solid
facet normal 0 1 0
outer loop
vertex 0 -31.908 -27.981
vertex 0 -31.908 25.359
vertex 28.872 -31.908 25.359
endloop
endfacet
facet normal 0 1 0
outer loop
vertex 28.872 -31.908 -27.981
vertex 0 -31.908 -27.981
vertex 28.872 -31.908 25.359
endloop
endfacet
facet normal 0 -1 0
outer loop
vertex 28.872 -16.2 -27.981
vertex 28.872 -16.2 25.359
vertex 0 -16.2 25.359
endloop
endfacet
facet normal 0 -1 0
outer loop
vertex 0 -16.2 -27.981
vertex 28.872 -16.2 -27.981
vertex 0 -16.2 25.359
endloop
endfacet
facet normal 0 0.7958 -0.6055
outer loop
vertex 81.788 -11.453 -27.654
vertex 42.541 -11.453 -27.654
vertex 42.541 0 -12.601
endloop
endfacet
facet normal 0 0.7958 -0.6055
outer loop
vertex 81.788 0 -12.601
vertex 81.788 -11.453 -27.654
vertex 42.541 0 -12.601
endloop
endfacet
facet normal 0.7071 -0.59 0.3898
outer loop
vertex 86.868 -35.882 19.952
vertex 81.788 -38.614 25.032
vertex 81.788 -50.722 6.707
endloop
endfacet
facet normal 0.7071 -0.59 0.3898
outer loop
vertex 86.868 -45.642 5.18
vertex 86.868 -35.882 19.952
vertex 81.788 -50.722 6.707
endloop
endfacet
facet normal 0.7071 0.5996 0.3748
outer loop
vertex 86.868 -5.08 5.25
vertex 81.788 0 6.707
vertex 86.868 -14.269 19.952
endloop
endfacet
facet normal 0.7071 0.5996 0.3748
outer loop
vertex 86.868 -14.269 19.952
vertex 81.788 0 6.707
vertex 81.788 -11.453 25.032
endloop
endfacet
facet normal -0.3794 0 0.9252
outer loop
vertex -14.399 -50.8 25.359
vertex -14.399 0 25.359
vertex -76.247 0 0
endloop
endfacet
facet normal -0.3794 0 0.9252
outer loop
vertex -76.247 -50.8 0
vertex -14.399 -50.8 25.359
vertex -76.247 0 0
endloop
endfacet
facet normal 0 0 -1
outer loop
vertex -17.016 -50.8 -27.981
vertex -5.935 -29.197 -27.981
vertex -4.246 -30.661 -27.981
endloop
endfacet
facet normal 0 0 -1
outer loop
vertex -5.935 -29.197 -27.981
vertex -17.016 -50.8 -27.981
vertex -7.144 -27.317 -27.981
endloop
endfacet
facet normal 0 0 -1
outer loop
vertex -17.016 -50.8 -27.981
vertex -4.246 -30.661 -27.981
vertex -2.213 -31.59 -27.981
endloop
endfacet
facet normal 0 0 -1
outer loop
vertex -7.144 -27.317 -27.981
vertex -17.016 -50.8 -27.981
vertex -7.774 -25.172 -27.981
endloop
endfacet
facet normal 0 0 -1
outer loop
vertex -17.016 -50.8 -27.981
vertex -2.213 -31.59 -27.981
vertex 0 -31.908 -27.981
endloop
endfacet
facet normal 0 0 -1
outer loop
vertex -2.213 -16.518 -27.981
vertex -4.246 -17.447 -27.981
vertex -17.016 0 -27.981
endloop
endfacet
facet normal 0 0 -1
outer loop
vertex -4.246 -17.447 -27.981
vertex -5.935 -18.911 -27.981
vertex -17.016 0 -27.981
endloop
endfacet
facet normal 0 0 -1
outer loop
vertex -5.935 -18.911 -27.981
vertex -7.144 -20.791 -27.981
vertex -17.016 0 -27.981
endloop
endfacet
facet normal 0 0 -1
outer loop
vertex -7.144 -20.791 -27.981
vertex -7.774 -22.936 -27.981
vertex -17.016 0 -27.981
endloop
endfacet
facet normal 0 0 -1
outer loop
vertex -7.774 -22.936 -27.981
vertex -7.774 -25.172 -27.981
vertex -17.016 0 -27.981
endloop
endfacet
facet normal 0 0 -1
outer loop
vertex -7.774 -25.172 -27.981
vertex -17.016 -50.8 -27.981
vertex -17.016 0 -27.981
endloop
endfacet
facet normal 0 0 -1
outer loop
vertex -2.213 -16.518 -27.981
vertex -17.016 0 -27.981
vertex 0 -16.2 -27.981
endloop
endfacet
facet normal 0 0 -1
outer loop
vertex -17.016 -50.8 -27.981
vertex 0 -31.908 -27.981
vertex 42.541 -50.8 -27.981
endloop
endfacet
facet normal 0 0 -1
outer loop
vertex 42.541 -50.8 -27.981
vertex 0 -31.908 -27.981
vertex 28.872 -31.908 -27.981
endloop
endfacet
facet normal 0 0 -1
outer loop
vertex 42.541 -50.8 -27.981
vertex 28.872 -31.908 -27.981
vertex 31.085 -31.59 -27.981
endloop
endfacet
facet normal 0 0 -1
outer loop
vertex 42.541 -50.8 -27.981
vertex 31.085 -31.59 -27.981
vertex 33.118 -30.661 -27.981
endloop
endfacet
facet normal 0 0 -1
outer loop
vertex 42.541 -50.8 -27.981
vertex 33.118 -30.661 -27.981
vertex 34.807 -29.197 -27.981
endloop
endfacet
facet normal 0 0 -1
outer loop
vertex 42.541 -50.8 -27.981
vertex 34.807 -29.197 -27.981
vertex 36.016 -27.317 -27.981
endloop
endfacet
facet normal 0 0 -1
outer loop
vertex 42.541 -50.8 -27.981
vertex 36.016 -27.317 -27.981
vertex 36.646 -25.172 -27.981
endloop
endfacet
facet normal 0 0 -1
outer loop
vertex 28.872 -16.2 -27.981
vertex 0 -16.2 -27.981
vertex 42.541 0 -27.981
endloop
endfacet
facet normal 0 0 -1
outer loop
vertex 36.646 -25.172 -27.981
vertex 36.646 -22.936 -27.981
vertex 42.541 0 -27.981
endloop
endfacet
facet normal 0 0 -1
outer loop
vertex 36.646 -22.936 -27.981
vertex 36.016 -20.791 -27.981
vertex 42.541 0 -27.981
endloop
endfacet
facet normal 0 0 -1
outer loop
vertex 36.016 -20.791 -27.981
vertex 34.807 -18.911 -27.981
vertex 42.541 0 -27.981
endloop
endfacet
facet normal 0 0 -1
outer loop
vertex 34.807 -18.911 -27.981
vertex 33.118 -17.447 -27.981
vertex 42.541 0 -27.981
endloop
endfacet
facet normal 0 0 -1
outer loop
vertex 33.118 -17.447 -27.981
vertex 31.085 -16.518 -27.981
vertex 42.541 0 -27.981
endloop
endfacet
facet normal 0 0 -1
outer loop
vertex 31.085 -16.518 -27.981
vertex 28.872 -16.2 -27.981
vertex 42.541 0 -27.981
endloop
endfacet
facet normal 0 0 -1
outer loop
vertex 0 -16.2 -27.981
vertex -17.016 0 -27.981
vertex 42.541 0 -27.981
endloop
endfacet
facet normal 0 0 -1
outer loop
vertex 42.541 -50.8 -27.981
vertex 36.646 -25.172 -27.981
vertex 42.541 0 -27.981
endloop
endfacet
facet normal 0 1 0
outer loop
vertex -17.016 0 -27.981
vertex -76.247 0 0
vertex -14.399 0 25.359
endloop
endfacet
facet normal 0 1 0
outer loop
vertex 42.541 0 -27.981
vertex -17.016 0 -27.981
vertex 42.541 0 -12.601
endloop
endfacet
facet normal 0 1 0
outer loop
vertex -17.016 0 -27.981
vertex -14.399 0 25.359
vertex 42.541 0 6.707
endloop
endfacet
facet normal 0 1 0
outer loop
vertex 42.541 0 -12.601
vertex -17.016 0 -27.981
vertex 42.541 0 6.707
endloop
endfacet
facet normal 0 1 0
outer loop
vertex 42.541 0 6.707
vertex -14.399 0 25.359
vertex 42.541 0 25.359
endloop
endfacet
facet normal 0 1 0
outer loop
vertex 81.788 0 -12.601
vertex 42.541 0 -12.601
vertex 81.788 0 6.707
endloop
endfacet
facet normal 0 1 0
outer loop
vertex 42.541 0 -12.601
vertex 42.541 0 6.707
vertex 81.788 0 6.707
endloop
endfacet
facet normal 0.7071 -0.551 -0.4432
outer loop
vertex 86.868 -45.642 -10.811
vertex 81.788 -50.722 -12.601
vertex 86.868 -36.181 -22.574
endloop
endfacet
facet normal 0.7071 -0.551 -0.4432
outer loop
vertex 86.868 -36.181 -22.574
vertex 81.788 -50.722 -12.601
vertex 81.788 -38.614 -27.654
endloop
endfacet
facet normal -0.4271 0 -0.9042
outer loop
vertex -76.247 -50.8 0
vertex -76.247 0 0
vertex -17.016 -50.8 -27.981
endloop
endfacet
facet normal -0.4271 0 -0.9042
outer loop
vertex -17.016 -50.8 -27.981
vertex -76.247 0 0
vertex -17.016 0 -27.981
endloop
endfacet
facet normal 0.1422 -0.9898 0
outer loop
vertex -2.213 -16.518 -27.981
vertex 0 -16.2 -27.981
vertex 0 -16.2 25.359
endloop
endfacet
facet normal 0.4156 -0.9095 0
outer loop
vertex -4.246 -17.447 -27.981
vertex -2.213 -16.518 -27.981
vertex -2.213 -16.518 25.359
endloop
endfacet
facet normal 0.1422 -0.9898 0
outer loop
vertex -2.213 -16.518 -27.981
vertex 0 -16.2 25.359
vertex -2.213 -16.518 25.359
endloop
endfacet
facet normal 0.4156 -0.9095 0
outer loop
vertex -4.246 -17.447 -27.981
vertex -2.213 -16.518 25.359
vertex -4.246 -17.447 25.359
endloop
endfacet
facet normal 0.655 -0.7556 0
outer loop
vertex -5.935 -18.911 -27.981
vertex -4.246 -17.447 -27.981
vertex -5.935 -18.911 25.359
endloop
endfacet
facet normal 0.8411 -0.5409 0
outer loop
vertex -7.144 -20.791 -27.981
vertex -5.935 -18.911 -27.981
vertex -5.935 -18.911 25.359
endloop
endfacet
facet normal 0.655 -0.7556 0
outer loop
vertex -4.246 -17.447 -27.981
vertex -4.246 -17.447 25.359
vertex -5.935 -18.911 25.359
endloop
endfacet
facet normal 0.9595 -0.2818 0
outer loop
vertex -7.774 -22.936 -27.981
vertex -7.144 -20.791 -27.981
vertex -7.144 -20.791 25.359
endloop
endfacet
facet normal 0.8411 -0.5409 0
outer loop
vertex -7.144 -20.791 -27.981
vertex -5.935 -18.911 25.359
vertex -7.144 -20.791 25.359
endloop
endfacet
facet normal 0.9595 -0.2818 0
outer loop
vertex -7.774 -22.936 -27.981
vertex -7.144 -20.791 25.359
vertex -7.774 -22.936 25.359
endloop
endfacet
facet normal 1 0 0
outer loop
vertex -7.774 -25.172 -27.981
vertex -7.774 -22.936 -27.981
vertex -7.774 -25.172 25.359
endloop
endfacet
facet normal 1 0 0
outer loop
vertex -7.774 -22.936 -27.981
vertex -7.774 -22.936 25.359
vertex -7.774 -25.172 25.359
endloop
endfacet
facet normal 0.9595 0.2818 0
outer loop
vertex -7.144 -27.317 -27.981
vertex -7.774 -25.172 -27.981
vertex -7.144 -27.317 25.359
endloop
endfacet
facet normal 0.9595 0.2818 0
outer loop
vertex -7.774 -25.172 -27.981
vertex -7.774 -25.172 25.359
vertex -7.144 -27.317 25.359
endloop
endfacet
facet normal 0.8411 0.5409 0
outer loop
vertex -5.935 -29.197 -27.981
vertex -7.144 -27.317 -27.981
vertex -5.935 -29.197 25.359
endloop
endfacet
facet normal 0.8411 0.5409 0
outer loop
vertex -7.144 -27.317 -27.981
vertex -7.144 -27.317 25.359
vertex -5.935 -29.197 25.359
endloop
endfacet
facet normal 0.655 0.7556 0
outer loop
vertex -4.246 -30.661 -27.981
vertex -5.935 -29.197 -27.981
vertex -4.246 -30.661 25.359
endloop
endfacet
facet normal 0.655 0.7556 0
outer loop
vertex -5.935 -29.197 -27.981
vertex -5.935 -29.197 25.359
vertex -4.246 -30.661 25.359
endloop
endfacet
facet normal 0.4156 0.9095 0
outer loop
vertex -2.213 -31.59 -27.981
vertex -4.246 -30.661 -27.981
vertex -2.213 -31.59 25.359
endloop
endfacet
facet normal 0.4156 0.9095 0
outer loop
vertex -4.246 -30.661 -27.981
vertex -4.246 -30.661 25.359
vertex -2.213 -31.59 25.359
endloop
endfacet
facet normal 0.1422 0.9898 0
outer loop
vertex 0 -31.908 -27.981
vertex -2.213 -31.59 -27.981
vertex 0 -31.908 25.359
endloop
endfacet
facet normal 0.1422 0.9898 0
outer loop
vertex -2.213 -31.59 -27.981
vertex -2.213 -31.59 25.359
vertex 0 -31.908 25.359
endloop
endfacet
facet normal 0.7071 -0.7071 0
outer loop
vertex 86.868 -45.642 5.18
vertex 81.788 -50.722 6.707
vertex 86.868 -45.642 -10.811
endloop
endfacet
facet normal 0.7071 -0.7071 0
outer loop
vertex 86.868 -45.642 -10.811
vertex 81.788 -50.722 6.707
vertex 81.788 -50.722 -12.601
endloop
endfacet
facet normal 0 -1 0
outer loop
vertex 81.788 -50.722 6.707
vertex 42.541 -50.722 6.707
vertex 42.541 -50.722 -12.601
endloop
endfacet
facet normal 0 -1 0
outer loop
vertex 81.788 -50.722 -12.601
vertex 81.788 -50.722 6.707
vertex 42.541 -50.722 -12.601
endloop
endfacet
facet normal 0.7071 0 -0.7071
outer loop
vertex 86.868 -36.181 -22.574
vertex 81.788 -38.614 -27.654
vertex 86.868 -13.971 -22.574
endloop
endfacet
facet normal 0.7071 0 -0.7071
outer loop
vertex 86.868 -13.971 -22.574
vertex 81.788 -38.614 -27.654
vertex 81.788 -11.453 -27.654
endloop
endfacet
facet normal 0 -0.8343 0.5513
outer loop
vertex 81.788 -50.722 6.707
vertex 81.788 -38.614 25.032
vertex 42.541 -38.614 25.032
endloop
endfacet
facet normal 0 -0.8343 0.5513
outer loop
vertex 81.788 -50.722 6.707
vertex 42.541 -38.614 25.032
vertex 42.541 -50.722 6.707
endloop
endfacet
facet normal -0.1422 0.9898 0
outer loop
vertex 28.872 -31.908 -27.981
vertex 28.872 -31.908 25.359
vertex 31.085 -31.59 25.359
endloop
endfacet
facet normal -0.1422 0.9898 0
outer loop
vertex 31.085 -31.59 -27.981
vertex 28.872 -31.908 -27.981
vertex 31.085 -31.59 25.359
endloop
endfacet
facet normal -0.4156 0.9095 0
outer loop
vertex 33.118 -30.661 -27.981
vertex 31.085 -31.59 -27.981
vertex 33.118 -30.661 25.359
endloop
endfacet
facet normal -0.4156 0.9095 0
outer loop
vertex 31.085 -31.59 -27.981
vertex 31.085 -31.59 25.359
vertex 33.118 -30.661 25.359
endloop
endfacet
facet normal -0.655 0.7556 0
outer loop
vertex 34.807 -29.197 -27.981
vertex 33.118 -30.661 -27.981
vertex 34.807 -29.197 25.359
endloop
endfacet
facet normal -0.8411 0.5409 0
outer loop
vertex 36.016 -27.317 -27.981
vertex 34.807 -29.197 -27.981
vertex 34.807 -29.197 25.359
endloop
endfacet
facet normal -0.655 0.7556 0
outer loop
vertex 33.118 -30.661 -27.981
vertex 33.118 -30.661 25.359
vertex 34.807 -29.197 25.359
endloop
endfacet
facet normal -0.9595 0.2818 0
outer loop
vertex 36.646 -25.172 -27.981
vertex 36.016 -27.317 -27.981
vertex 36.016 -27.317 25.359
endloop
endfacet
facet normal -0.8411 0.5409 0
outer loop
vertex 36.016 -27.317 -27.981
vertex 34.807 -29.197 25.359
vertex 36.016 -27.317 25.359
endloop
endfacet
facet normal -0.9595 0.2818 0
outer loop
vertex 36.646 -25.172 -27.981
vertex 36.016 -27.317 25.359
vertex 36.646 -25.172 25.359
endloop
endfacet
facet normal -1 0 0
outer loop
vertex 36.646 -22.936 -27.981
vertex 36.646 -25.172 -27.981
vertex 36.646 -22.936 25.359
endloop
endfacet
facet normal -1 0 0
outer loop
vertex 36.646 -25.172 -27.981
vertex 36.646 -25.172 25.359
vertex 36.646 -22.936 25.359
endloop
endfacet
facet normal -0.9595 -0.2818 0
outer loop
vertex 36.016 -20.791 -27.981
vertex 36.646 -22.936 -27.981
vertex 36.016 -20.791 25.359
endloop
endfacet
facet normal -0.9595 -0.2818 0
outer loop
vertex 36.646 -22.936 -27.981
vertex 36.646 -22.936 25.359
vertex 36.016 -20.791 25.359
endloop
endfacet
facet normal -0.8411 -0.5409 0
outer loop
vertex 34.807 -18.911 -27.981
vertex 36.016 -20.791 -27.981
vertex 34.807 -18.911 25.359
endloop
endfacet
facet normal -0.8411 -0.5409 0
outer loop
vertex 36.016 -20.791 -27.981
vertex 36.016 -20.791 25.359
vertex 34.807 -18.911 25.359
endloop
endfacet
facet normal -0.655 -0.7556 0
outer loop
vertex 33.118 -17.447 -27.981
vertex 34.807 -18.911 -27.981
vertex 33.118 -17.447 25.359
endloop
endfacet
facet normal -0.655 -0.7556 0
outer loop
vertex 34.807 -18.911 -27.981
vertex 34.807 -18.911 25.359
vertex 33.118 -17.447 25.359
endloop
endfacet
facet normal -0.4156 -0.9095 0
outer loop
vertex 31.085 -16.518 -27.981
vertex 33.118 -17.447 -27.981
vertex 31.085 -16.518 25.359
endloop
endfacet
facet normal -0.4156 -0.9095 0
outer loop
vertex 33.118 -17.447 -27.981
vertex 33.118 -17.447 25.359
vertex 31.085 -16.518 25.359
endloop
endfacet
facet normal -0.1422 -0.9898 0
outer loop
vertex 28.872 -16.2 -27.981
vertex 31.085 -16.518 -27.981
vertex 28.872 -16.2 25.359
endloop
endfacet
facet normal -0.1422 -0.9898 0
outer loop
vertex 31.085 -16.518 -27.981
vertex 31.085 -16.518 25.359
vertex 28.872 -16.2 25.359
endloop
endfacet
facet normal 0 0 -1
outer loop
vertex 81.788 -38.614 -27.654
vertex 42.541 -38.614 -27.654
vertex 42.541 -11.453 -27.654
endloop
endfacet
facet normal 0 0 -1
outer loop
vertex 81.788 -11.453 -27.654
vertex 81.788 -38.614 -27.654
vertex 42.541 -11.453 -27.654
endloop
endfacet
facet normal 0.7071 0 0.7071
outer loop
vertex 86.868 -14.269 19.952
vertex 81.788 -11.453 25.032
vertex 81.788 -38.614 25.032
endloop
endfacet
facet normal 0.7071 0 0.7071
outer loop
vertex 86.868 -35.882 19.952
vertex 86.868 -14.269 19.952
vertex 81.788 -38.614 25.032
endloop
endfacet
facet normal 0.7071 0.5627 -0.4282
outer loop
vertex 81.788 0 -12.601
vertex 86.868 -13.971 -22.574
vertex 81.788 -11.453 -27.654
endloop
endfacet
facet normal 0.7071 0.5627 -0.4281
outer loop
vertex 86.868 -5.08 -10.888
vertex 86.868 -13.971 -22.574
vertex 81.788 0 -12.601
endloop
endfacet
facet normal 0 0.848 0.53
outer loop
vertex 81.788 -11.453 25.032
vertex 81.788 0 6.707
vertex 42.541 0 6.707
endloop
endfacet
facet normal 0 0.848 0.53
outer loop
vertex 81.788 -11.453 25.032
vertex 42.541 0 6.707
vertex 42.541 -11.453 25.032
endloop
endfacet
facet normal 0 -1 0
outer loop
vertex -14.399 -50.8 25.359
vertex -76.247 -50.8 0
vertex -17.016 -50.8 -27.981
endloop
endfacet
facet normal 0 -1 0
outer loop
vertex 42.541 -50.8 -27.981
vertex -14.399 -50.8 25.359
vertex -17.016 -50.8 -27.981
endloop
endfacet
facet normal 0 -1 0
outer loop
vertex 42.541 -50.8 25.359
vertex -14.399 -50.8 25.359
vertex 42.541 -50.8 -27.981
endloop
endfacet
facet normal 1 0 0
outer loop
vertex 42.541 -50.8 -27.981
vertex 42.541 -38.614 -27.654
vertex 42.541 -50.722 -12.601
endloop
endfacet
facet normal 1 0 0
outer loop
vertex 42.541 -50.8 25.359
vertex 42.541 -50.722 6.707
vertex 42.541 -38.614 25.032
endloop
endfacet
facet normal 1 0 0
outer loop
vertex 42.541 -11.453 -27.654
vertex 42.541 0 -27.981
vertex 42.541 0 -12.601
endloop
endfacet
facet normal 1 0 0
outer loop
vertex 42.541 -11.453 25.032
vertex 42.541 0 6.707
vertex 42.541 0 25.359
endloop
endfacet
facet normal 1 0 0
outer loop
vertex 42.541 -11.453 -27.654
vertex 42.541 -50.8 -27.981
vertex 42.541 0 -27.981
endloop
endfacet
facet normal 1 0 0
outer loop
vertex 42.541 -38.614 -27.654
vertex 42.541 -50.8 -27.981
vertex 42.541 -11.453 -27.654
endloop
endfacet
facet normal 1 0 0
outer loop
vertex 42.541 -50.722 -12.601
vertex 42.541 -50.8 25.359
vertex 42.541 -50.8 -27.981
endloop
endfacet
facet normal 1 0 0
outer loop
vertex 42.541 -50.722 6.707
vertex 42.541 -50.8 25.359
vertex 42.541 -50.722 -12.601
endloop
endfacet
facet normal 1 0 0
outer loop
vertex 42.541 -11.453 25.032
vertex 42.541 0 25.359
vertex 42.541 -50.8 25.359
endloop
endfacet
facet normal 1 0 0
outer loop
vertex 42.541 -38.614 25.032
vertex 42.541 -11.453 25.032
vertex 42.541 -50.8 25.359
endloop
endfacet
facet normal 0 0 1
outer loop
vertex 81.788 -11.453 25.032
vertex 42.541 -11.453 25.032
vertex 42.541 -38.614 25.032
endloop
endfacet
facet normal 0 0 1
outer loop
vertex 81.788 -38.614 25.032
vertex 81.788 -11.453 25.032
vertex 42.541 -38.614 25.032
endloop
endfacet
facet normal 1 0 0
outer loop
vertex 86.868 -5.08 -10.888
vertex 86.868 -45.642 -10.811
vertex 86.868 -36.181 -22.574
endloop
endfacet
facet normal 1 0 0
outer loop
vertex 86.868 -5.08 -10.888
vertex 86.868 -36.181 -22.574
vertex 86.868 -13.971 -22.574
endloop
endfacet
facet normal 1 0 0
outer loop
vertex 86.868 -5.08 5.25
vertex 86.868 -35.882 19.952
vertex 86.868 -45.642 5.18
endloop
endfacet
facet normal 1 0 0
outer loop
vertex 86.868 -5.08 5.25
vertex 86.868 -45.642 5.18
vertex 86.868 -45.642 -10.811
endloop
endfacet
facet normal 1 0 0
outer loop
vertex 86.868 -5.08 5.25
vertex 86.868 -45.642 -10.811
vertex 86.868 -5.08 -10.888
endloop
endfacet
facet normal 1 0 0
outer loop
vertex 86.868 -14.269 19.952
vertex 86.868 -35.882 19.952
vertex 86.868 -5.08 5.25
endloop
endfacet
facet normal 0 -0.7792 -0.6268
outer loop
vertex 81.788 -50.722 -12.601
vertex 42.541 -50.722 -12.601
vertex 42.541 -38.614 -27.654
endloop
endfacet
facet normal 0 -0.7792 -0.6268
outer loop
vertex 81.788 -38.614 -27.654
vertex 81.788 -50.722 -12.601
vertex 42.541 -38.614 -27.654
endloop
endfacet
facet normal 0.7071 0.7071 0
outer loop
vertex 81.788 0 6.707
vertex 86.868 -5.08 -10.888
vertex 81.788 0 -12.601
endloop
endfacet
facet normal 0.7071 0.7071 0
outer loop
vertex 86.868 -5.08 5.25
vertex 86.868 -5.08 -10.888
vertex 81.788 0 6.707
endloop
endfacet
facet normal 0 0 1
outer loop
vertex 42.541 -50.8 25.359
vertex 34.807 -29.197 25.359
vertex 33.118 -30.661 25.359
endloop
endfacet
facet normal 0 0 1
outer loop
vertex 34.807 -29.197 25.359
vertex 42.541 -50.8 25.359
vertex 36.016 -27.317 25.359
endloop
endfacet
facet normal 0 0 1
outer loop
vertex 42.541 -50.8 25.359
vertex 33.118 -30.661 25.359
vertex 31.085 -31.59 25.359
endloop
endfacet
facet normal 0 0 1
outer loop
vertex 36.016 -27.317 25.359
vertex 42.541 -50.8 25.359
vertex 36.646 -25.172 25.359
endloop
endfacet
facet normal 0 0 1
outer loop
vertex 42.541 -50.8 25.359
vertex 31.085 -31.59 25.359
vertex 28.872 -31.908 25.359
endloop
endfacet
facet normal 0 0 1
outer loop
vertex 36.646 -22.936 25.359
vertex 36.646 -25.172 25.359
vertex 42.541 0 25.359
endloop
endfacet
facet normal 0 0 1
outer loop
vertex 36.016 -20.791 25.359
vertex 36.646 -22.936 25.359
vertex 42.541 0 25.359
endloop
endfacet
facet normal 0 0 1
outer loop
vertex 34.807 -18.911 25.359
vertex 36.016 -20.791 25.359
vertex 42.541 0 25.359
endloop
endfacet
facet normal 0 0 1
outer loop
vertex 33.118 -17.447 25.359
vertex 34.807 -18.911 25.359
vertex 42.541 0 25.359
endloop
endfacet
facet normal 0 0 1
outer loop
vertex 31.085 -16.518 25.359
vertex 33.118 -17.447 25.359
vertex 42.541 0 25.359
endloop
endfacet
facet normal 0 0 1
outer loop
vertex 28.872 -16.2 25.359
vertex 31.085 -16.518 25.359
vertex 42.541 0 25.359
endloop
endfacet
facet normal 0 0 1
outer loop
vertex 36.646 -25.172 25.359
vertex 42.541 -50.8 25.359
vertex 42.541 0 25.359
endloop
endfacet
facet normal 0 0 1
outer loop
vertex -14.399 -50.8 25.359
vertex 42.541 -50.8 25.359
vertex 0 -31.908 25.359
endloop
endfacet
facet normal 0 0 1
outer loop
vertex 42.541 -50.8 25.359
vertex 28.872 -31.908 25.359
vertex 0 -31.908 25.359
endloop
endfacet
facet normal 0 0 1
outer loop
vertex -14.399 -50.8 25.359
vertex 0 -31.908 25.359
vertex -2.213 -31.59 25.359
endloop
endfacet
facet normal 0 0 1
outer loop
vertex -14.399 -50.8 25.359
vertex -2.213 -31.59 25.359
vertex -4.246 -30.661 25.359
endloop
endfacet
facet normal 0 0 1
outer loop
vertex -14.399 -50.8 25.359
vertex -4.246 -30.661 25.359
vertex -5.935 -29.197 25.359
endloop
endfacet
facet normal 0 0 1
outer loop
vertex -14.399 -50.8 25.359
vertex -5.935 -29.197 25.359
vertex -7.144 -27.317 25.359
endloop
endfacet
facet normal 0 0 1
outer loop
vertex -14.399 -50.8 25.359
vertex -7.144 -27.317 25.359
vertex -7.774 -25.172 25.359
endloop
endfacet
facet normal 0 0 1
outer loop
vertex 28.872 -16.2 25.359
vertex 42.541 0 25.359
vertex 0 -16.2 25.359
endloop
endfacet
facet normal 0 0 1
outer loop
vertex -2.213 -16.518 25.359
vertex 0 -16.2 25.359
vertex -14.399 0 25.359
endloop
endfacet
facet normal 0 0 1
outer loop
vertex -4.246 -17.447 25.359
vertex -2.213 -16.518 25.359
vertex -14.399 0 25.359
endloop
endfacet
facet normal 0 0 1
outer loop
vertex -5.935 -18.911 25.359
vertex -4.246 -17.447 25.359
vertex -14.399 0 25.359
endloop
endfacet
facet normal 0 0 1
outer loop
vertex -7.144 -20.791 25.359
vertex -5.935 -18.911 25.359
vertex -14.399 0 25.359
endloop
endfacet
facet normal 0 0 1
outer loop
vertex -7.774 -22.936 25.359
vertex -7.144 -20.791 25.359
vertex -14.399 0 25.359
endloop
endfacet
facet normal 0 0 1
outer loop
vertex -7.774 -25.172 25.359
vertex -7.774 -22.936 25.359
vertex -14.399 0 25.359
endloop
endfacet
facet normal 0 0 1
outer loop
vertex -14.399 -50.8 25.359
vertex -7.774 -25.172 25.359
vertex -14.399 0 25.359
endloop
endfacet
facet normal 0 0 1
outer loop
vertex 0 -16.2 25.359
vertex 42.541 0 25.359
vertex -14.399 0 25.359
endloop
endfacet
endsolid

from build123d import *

# Parameters (mm, degrees)
F1_DEPTH = 50.8
F3_DEPTH = 86.868
F5_DEPTH = 97.028
F6_SIZE  = 5.08


with BuildPart() as f1:
    # F0 (on Front) → F1 (new body)
    with BuildSketch(Plane.XZ):
        Polygon((-14.398527, 25.359184), (-76.246753, 0), (-17.016442, -27.980816), (42.541102, -27.980816), (42.541102, 25.359184), align=None)
    extrude(amount=F1_DEPTH)

    # F2 (on Right) → F3 (join)
    with BuildSketch(Plane.YZ):
        Polygon((-11.453375, 25.031945), (-38.614232, 25.031945), (-50.722085, 6.706545), (-50.722085, -12.600573), (-38.614232, -27.653579), (-11.453375, -27.653579), (0, -12.600573), (0, 6.706545), align=None)
    extrude(amount=F3_DEPTH)

    # F4 (on face) → F5 (cut)
    with BuildSketch(Plane.XY.offset(25.359184)):
        with BuildLine():
            Line((28.871851, -16.200203), (0, -16.200203))
            ThreePointArc((0, -16.200203), (-7.853743, -24.053946), (0, -31.907689))
            Line((0, -31.907689), (28.871851, -31.907689))
            ThreePointArc((28.871851, -31.907689), (36.725594, -24.053946), (28.871851, -16.200203))
        make_face()
    extrude(amount=-F5_DEPTH, mode=Mode.SUBTRACT)

    # F6
    f6_edges = [f1.edges().sort_by_distance(p)[0] for p in [
        (86.868, -25.033804, 25.031945),
        (86.868, -5.726688, 15.869245),
        (86.868, 0, -2.947014),
        (86.868, -5.726688, -20.127076),
        (86.868, -25.033804, -27.653579),
        (86.868, -44.668159, 15.869245),
        (86.868, -50.722085, -2.947014),
        (86.868, -44.668159, -20.127076),
    ]]
    chamfer(f6_edges, length=F6_SIZE)


solid = f1.part
